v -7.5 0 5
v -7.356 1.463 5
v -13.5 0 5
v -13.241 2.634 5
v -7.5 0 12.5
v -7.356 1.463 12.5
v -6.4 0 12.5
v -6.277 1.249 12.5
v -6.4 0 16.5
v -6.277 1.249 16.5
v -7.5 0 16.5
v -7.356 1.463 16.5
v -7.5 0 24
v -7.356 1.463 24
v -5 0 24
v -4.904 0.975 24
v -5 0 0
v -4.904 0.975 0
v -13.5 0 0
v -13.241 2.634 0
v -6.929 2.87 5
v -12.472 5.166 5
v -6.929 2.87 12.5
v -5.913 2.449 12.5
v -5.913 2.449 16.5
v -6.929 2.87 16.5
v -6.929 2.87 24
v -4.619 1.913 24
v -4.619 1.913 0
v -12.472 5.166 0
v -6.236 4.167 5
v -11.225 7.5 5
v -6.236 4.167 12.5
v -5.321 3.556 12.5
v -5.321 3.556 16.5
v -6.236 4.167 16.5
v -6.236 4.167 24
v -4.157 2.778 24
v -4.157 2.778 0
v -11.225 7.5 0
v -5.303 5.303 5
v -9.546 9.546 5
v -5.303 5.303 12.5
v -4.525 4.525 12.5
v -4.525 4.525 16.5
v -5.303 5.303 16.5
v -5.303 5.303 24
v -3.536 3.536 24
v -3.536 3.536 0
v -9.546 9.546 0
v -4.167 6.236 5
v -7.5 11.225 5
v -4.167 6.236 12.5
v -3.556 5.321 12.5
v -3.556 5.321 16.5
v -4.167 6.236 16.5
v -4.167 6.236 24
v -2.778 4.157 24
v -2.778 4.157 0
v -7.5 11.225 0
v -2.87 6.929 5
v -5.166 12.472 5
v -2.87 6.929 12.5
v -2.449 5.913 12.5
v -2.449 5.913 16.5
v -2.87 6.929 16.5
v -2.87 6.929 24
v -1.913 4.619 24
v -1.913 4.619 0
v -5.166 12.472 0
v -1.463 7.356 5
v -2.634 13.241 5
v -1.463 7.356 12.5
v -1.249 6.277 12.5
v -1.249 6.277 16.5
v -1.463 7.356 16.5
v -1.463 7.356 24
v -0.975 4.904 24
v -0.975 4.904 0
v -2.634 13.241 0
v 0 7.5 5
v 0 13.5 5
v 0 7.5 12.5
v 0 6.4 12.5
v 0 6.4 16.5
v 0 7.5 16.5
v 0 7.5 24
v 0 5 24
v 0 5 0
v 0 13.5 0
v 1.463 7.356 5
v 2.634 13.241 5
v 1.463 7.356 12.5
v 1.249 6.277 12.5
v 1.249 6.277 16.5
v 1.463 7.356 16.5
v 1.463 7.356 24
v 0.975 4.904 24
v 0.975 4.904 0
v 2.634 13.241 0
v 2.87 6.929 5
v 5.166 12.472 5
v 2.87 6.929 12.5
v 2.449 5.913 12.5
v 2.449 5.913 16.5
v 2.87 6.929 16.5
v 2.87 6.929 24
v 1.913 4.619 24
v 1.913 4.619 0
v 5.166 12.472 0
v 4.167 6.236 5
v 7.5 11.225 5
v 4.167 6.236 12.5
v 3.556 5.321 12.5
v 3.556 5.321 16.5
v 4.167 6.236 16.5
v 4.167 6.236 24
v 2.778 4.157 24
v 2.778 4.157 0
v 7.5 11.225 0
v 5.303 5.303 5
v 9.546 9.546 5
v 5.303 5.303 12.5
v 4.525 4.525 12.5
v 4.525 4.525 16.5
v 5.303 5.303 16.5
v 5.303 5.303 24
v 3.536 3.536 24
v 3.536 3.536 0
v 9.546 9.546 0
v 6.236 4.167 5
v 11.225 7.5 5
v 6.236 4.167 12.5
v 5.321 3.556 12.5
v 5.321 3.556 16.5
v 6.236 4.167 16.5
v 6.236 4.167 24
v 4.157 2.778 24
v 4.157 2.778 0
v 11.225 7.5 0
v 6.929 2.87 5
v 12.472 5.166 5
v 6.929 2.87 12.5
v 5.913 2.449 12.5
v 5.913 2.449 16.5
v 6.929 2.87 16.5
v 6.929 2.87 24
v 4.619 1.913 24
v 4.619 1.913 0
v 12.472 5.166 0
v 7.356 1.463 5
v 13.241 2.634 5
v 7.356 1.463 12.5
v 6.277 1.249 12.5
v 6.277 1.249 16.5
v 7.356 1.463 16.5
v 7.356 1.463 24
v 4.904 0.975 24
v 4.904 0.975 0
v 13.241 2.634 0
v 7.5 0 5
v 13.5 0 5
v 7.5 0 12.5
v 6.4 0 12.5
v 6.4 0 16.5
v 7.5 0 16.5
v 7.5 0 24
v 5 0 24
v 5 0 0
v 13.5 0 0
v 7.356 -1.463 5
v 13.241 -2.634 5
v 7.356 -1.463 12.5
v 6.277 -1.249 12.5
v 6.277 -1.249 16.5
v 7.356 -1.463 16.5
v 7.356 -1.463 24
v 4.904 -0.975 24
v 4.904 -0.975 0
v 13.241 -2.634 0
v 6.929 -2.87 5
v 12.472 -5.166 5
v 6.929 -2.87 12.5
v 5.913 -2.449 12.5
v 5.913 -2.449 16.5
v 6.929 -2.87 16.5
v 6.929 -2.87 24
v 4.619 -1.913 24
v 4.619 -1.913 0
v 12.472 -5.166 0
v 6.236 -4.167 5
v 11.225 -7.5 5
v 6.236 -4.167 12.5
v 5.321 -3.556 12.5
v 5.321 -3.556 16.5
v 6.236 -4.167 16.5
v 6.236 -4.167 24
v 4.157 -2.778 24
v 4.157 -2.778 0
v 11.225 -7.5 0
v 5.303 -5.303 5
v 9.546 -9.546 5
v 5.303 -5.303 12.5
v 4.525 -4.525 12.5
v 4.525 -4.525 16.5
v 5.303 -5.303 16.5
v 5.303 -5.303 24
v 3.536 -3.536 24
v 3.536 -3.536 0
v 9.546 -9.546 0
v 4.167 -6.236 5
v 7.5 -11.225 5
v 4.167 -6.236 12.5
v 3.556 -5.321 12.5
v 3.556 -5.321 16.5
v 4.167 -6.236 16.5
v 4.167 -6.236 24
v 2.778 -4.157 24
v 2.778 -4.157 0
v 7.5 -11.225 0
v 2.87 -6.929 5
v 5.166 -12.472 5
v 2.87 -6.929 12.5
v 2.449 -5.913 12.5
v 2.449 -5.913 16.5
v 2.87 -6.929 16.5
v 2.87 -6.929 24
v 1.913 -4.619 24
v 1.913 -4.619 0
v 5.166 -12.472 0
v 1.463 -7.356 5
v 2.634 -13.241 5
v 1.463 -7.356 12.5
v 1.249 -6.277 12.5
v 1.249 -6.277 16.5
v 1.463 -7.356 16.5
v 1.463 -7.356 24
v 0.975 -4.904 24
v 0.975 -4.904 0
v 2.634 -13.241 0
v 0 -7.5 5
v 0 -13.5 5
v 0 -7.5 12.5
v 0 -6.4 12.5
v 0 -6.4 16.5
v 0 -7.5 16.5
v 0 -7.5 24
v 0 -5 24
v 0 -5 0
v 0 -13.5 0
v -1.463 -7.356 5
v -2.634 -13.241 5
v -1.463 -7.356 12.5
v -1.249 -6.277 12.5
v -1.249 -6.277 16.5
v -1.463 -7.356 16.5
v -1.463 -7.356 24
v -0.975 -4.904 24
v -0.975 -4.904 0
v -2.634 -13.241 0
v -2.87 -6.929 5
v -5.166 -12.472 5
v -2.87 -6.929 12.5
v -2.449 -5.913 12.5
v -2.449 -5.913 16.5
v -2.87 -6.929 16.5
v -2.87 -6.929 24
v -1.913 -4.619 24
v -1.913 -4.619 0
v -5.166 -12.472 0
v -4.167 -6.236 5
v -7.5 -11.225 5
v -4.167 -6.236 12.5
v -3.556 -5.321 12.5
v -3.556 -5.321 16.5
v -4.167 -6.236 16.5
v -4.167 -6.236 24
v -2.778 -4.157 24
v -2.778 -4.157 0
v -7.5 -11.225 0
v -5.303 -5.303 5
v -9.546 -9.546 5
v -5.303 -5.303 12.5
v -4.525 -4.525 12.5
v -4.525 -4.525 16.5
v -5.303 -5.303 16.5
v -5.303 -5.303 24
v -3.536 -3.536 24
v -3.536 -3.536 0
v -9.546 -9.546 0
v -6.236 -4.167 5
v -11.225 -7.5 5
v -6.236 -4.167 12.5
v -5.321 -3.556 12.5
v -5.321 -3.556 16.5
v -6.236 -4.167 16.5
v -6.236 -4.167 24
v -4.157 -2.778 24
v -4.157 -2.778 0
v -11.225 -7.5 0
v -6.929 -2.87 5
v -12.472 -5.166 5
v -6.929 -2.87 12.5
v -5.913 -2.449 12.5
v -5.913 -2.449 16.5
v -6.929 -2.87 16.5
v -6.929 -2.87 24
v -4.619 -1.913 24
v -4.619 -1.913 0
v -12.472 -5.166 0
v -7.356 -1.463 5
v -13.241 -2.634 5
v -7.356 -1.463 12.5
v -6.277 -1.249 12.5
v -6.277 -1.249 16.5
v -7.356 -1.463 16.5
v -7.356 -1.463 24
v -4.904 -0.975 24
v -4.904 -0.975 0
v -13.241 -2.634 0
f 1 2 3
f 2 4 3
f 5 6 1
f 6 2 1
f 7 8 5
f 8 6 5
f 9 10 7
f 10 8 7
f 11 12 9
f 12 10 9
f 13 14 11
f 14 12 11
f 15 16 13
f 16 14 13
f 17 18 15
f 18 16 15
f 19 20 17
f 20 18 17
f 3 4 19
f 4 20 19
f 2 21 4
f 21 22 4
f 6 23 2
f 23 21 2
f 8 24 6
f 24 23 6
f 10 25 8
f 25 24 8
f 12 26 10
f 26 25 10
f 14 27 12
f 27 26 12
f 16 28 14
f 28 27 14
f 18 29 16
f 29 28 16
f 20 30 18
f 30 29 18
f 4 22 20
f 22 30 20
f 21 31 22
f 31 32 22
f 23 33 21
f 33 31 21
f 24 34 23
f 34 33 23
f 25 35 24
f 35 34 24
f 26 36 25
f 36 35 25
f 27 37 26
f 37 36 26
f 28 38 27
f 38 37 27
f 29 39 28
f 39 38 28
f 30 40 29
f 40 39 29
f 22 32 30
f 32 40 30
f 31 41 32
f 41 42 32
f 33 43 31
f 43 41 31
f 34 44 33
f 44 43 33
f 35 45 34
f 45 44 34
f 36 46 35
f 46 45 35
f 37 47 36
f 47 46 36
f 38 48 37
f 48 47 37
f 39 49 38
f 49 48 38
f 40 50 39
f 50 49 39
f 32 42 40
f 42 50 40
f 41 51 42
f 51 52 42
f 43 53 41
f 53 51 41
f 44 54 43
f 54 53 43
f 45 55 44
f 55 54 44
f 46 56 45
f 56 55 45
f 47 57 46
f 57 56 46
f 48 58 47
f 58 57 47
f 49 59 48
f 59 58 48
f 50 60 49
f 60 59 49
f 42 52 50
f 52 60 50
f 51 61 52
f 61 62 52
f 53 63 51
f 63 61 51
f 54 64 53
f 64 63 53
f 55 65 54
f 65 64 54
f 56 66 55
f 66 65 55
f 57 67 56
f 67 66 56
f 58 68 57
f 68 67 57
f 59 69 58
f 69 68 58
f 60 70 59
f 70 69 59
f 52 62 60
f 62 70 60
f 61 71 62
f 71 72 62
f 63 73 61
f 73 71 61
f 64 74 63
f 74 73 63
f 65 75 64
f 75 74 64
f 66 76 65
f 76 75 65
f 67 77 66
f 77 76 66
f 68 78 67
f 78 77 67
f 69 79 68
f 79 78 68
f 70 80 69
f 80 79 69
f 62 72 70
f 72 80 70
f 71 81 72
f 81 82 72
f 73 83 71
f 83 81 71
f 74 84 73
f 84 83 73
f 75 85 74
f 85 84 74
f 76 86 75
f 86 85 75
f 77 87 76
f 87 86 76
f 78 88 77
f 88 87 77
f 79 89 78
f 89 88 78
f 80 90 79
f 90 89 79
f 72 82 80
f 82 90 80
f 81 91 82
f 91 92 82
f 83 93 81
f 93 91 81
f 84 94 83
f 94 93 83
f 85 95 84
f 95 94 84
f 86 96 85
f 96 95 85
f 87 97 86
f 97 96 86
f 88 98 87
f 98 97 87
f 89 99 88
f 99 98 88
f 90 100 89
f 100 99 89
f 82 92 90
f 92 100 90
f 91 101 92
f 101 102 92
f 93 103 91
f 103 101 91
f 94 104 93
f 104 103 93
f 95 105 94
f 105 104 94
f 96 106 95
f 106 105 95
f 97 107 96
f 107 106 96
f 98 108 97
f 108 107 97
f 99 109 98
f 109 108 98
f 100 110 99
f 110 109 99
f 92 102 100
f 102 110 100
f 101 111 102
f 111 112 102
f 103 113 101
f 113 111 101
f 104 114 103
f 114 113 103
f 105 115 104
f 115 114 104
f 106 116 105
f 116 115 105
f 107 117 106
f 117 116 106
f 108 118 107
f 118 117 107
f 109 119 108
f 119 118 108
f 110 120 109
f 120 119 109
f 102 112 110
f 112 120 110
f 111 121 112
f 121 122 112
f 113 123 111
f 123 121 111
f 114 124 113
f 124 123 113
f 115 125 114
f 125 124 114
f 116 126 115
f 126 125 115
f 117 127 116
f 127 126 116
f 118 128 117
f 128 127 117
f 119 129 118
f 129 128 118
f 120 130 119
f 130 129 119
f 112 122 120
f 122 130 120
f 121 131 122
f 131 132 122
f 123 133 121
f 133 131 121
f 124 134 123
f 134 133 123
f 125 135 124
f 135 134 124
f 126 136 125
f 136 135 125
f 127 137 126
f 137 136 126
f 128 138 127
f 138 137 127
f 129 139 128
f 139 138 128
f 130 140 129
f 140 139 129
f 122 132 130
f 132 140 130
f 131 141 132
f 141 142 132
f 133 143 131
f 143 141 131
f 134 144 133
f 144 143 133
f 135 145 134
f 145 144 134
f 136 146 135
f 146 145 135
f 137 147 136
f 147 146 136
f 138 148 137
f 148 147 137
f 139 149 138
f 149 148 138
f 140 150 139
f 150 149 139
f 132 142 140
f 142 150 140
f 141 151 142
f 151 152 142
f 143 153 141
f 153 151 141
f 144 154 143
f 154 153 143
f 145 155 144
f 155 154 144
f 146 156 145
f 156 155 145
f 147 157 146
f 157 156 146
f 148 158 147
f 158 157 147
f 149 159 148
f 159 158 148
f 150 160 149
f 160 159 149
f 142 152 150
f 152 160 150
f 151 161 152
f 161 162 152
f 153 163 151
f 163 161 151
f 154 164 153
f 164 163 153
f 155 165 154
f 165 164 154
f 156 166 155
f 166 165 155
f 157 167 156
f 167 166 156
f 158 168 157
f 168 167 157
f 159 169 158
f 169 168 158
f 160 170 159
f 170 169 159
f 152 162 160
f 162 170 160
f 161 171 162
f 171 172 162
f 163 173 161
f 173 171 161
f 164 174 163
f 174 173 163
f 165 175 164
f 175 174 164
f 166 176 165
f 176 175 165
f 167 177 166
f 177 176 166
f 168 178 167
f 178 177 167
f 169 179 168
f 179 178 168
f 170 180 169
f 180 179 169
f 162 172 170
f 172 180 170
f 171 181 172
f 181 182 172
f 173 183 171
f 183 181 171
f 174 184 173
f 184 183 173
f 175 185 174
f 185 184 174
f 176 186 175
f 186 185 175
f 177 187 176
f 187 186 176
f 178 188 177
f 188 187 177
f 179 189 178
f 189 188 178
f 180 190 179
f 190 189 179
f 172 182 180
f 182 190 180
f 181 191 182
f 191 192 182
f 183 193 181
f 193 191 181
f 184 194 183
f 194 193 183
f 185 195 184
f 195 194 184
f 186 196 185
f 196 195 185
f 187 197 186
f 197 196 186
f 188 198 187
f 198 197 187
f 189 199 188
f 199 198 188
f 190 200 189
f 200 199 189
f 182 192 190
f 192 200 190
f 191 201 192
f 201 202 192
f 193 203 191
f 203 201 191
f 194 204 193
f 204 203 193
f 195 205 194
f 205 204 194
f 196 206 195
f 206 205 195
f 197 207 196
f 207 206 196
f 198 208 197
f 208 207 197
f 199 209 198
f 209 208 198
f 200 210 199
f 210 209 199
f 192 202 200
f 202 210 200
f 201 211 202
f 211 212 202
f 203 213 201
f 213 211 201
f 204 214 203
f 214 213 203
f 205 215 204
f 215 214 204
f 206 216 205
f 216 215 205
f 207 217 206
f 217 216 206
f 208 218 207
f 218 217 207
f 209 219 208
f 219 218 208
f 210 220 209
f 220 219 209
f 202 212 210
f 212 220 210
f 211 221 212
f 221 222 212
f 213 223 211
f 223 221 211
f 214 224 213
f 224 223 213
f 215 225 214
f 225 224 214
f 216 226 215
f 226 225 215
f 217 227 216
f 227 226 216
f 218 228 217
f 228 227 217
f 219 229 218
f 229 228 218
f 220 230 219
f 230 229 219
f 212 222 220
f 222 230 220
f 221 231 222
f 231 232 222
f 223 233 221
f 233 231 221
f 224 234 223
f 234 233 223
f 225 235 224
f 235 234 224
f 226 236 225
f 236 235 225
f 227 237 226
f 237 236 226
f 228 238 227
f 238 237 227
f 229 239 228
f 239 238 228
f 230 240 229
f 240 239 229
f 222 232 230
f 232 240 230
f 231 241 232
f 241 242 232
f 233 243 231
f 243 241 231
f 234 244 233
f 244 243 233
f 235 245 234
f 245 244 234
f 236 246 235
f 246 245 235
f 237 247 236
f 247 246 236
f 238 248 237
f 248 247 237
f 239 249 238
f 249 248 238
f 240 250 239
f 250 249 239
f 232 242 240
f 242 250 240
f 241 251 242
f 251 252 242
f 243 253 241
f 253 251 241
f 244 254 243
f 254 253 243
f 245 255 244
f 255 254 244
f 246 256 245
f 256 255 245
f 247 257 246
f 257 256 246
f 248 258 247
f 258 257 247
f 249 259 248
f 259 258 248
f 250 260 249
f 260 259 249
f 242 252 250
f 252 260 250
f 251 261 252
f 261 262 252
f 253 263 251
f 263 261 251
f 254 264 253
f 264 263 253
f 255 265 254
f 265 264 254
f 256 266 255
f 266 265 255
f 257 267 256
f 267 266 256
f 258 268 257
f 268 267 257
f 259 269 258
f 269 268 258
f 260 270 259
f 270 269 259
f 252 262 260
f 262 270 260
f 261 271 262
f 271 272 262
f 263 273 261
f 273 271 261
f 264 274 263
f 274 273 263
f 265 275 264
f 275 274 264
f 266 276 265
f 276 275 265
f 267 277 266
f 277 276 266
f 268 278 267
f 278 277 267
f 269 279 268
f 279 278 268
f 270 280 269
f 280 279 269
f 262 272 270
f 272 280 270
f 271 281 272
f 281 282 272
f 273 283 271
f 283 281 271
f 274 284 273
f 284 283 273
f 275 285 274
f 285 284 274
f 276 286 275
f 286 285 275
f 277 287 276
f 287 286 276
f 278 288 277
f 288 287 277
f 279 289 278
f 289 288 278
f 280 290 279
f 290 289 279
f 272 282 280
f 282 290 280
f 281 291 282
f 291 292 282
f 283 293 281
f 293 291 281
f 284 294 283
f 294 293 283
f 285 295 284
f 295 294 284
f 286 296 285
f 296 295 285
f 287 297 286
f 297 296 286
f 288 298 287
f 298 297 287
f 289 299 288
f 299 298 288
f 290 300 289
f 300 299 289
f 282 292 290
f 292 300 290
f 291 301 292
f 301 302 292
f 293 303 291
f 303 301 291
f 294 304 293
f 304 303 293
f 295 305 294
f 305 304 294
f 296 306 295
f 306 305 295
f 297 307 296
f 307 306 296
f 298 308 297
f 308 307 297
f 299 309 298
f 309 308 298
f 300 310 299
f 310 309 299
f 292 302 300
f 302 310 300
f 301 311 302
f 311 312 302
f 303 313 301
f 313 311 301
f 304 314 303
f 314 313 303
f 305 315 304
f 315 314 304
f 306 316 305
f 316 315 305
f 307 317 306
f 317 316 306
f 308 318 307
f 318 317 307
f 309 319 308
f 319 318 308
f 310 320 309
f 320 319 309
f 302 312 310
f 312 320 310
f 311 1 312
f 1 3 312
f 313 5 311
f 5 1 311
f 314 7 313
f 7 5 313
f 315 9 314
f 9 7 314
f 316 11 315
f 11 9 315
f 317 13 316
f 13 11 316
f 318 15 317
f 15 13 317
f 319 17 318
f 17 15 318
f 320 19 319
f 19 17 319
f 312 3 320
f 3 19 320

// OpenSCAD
$fn = 32;

// ----------------------------------------------------------------------
// Grooved revolve: flanged, bore R5
// ----------------------------------------------------------------------

// --- parameters (mm) ---
bore_r = 5;               // bore radius
outer_r = 7.5;            // outer radius of the body
total_h = 24;             // overall height, Z
wall = 2.5;               // radial wall thickness
groove_w = 4;             // groove width
groove_d = 1.1;           // groove depth
grooves = 1;              // number of outer grooves
flange_r = 13.5;          // flange radius
flange_h = 5;             // flange height

bbox_x = 2 * flange_r;  // full diameter
bore_d = 2 * bore_r;  // bore diameter
body_d = 2 * outer_r;  // body diameter
flange_d = 2 * flange_r;  // flange diameter
revolve_angle = 360;  // full turn around the Z axis

profile = [[5, 0], [7.5, 0], [13.5, 0], [13.5, 5], [7.5, 5], [7.5, 12.5], [6.4, 12.5], [6.4, 16.5], [7.5, 16.5], [7.5, 24], [5, 24]];  // primary outline, 11 points, counter clockwise

// --- the one profile operation ---
rotate_extrude(angle = revolve_angle) polygon(points = profile);
